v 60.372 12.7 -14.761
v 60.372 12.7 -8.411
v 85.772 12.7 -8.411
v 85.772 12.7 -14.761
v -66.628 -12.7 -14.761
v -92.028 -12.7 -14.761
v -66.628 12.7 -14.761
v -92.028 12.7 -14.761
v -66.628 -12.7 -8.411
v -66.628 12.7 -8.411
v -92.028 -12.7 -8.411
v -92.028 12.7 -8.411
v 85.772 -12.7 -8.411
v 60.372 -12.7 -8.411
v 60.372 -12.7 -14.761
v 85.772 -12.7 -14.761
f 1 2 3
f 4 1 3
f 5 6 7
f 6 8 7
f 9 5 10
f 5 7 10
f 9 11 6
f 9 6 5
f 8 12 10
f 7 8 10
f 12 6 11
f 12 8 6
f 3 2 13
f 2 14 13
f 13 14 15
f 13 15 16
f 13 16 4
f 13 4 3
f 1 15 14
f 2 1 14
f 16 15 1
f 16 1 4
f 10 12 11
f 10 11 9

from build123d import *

# Parameters (mm, degrees)
F0_W     = 25.4
F0_H     = 6.35
F1_DEPTH = 12.7


with BuildPart() as f1:
    # F0 (on Front) → F1 (new body, symmetric)
    with BuildSketch(Plane.XZ):
        with Locations((-79.328354, -11.585954)):
            Rectangle(F0_W, F0_H)
        with Locations((73.071646, -11.585954)):
            Rectangle(F0_W, F0_H)
    extrude(amount=F1_DEPTH, both=True)


solid = f1.part
